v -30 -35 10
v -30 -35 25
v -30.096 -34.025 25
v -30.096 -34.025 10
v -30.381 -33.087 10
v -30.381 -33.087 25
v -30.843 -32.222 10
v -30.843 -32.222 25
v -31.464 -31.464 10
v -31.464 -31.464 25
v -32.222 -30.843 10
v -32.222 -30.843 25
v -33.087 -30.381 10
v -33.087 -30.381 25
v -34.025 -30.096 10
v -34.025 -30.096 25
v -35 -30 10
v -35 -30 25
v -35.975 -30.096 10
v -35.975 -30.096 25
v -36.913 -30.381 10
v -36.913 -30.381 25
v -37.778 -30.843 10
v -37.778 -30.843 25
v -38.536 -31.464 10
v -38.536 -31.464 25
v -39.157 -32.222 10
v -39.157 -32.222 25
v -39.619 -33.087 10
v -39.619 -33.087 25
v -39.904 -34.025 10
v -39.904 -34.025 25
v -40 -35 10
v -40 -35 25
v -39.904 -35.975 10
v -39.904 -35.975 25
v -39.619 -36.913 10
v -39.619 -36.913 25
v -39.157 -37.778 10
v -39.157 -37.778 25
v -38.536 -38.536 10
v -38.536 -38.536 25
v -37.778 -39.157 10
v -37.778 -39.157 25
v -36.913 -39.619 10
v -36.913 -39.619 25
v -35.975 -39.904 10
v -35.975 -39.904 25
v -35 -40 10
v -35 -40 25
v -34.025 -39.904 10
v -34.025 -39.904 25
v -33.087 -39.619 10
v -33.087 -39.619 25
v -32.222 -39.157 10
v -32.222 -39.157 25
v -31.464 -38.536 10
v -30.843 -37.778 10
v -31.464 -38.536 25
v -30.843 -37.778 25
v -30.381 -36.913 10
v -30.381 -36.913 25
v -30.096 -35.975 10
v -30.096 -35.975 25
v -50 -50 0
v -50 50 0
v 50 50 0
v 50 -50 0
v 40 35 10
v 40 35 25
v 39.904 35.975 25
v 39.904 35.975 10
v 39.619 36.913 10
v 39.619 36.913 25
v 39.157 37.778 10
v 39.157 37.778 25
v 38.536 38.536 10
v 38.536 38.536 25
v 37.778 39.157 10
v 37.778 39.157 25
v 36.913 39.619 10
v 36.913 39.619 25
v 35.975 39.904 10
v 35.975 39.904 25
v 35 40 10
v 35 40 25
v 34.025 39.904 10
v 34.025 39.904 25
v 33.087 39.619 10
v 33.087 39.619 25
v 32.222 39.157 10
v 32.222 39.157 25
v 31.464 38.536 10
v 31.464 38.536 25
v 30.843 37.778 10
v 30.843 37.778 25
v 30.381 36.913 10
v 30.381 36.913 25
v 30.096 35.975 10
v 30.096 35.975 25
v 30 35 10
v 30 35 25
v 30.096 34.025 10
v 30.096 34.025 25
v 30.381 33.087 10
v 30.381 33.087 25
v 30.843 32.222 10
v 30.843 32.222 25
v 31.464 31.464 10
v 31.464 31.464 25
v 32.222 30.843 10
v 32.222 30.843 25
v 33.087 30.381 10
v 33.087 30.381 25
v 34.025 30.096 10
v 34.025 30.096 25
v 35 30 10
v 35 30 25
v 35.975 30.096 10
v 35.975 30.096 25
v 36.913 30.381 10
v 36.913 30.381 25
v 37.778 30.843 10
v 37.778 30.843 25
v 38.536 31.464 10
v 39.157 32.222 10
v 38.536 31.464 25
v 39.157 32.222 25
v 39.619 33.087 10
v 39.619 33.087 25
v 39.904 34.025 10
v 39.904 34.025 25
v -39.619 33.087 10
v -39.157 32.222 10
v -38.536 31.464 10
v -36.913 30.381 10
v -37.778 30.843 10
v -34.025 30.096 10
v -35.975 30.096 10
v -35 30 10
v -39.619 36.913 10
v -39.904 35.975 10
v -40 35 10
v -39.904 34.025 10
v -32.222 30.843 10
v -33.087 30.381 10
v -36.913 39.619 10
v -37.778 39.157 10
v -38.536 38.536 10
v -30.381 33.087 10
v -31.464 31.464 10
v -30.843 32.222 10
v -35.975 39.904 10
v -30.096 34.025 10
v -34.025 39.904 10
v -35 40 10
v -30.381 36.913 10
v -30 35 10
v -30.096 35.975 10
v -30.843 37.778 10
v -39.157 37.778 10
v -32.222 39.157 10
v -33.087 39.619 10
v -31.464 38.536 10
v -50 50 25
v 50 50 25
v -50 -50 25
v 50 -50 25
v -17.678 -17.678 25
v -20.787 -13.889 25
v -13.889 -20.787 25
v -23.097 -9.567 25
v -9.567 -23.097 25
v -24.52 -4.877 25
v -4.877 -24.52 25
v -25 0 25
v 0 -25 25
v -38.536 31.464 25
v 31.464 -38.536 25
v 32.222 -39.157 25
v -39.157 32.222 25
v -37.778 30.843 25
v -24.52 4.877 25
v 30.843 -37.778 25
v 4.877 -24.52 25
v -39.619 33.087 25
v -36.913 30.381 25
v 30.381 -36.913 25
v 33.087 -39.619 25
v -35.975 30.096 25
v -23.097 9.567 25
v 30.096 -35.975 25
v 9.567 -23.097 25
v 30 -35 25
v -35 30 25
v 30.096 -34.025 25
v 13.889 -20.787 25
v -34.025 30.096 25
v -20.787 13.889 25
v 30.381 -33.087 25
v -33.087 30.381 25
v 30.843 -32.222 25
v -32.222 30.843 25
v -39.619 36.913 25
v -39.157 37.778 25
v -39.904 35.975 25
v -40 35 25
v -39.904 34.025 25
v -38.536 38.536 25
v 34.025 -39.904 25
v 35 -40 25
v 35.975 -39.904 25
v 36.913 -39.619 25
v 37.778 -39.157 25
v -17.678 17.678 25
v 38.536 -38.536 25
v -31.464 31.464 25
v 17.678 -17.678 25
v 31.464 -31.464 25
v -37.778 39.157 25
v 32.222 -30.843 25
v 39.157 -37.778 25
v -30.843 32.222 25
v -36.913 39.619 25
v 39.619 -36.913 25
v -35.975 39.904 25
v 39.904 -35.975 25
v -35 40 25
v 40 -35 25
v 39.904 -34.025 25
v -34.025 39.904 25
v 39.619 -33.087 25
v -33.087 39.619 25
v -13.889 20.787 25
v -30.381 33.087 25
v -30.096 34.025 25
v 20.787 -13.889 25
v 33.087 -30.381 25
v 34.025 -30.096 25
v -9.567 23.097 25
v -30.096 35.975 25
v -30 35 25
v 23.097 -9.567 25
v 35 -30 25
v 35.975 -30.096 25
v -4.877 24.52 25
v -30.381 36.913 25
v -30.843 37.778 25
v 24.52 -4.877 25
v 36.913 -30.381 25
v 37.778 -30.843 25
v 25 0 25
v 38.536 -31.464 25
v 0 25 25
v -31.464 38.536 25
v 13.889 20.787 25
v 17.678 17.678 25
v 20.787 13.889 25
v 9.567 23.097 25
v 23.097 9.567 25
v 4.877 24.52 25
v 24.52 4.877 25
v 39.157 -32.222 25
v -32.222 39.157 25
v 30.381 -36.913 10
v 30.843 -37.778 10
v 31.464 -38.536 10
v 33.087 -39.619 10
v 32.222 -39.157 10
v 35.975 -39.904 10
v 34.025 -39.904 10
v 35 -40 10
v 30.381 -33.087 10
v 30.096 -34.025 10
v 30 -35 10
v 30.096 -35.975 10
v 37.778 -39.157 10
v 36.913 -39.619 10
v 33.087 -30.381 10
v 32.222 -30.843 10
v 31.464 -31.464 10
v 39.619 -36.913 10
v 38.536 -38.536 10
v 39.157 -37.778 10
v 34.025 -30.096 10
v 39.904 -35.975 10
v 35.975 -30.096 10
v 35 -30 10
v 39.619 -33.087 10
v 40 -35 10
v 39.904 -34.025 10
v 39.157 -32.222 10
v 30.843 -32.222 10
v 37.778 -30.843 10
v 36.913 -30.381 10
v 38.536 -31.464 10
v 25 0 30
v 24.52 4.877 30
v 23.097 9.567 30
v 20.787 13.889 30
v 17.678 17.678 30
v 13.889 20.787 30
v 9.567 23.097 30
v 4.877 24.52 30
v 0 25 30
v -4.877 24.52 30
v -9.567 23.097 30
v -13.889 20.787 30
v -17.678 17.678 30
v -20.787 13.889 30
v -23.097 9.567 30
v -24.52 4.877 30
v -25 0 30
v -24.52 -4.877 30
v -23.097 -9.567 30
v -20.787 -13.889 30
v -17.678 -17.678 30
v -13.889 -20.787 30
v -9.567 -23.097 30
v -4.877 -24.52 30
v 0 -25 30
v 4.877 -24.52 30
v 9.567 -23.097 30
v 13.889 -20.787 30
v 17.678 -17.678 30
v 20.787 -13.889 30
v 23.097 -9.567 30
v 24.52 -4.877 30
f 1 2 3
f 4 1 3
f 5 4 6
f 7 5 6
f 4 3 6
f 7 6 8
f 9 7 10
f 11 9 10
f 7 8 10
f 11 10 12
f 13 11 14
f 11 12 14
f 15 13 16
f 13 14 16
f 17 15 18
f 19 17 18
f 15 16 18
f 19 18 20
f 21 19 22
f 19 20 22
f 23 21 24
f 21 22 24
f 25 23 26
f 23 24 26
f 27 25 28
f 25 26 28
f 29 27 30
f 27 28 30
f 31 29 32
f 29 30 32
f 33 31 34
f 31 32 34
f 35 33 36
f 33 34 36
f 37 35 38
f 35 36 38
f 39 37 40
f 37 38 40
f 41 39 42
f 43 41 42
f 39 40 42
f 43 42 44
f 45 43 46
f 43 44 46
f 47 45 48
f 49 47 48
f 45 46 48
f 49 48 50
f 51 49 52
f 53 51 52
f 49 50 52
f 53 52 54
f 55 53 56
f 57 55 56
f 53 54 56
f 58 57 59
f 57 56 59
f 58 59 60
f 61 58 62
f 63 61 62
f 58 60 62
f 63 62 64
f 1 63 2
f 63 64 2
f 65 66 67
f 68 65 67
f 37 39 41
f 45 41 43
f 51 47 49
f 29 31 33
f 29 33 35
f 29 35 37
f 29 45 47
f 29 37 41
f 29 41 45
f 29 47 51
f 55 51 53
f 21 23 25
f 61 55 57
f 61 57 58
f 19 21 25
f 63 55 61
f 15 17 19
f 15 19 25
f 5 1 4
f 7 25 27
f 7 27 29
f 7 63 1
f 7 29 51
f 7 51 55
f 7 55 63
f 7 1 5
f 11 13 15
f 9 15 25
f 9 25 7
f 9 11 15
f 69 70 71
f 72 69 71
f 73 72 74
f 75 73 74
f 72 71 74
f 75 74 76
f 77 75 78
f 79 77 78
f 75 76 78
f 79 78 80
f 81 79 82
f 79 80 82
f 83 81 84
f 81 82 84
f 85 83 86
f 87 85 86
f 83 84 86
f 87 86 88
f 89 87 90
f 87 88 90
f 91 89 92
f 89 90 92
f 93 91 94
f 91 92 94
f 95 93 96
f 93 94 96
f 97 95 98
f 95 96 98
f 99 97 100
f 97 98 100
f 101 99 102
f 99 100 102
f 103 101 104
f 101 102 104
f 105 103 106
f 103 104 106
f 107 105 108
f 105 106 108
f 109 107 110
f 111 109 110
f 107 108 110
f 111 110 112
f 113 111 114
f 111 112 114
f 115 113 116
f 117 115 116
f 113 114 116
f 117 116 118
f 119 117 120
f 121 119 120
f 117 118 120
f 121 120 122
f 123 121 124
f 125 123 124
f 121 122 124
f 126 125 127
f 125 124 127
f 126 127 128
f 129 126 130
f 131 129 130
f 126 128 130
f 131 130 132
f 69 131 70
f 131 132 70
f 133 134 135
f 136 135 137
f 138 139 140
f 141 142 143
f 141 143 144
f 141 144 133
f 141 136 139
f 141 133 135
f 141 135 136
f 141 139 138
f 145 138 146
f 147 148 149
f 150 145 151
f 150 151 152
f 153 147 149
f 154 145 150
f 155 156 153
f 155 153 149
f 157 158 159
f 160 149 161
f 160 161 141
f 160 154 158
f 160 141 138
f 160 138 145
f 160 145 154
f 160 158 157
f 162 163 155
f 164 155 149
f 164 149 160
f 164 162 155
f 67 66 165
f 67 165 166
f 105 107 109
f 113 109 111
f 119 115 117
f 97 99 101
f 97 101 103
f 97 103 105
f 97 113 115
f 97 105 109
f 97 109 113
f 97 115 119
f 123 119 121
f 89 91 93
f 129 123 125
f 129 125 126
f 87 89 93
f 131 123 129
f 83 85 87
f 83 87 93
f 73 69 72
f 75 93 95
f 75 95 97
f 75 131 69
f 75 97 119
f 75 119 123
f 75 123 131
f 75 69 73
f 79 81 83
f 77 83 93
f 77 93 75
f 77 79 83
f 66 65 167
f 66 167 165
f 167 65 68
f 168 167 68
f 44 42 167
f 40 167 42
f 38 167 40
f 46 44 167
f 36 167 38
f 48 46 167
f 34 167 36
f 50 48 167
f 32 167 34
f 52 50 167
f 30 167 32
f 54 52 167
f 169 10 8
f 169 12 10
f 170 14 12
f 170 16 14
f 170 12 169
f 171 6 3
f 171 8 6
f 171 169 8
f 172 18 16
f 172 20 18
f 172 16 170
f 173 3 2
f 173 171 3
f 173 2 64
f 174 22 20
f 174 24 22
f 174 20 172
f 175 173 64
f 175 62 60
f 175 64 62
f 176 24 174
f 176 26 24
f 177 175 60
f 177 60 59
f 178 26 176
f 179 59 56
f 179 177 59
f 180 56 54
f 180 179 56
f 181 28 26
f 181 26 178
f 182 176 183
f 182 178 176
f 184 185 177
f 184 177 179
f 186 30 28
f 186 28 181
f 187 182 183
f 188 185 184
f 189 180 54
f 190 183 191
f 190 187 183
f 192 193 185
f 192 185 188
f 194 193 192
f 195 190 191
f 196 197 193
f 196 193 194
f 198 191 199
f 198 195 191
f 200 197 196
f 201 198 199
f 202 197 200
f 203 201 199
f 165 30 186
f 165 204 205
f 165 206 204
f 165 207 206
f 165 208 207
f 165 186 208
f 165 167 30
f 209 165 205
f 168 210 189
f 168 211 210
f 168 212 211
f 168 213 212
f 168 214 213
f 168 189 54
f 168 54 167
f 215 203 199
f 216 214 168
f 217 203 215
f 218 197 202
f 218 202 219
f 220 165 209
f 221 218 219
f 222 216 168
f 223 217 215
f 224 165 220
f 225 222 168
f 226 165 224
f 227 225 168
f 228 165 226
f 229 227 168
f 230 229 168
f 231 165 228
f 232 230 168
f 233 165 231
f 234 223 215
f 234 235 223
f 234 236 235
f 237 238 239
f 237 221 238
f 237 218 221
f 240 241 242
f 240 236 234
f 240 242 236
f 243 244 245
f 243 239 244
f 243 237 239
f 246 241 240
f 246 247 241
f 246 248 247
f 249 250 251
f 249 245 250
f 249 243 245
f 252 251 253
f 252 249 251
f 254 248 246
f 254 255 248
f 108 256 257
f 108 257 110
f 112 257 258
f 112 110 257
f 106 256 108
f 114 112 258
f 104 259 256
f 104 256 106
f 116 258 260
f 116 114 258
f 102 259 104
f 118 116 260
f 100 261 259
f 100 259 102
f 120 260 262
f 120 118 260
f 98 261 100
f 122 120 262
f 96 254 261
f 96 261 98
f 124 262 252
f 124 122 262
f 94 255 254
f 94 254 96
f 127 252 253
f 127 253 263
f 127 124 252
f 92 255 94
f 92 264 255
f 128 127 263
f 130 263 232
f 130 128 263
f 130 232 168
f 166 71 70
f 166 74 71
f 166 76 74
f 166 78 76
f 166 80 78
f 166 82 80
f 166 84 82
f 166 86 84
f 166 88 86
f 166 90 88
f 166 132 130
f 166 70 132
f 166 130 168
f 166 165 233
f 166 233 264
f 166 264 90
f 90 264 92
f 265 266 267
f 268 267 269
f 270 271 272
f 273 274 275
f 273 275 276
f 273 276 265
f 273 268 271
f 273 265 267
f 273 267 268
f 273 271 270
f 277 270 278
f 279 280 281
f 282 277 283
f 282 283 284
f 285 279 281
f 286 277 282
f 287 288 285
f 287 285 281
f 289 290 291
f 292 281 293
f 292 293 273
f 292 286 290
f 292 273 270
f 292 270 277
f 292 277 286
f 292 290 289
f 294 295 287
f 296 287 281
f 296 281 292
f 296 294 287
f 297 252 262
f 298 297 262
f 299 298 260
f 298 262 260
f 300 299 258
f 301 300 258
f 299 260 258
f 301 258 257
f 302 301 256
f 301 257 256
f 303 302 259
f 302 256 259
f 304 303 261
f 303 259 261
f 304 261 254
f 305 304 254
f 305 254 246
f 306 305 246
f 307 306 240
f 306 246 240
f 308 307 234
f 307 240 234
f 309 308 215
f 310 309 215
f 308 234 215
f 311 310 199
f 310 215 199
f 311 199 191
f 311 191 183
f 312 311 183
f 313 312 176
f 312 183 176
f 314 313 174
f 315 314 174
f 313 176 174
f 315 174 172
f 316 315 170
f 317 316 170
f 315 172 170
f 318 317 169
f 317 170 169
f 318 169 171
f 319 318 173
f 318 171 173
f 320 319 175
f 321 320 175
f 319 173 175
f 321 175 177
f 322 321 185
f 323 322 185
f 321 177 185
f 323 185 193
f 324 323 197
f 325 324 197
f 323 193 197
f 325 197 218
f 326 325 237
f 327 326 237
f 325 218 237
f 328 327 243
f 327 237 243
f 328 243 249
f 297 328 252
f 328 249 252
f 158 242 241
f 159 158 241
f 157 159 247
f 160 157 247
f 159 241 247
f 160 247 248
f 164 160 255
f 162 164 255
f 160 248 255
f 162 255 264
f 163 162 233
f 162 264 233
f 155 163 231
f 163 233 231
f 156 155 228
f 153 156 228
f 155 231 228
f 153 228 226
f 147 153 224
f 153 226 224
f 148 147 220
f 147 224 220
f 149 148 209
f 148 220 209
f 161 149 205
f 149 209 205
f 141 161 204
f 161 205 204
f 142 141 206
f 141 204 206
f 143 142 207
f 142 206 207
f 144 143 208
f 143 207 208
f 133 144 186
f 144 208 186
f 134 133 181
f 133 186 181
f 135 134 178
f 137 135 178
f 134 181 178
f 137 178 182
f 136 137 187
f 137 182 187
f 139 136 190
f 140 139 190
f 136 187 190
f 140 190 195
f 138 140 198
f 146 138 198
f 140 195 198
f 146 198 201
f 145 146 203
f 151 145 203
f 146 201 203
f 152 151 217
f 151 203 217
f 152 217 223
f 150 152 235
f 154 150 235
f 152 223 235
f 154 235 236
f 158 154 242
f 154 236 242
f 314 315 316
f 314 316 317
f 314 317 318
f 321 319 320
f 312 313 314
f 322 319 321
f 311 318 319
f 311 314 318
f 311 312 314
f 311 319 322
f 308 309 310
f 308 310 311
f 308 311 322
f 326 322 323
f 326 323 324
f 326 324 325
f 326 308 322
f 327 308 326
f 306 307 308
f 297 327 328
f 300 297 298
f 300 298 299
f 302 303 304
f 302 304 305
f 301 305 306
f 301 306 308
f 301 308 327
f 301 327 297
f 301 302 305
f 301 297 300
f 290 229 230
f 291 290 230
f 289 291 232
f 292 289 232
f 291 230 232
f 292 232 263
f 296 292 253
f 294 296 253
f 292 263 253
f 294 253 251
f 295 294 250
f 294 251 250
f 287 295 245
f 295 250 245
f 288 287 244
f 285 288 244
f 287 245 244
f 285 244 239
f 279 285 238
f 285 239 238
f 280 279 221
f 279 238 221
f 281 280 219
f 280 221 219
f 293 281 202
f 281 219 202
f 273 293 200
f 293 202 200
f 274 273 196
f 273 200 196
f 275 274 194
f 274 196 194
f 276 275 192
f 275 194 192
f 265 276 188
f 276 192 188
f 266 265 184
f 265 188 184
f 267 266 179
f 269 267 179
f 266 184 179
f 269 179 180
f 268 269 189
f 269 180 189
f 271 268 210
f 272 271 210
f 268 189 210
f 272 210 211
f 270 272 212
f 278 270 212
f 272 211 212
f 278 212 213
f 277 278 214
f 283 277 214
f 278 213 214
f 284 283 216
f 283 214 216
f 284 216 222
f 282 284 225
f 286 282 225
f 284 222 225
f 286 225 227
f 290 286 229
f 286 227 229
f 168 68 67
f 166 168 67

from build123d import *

# Parameters (mm, degrees)
F0_W     = 100
F0_H     = 100
F1_DEPTH = 25
F2_R     = 25
F3_DEPTH = 5
F4_R     = 5
F5_DEPTH = 15


with BuildPart() as f1:
    # F0 (on Top) → F1 (new body)
    with BuildSketch(Plane.XY):
        Rectangle(F0_W, F0_H)
    extrude(amount=F1_DEPTH)

    # F2 (on face) → F3 (join)
    with BuildSketch(Plane.XY.offset(25)):
        Circle(F2_R)
    extrude(amount=F3_DEPTH)

    # F4 (on face) → F5 (cut)
    with BuildSketch(Plane.XY.offset(25)):
        with Locations((-35, -35)):
            Circle(F4_R)
        with Locations((-35, 35)):
            Circle(F4_R)
        with Locations((35, 35)):
            Circle(F4_R)
        with Locations((35, -35)):
            Circle(F4_R)
    extrude(amount=-F5_DEPTH, mode=Mode.SUBTRACT)


solid = f1.part
